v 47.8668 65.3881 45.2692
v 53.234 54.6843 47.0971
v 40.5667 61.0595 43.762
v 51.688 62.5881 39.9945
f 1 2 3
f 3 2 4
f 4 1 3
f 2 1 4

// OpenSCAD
// Auto-generated auxetic polyhedron
points = [
    [40.566748, 61.059511, 43.761973],
    [53.234011, 54.684341, 47.097148],
    [47.866830, 65.388116, 45.269245],
    [51.688004, 62.588105, 39.994544],
];

faces = [
    [0, 1, 2],
    [3, 1, 0],
    [0, 2, 3],
    [3, 2, 1],
];

polyhedron(points = points, faces = faces);
